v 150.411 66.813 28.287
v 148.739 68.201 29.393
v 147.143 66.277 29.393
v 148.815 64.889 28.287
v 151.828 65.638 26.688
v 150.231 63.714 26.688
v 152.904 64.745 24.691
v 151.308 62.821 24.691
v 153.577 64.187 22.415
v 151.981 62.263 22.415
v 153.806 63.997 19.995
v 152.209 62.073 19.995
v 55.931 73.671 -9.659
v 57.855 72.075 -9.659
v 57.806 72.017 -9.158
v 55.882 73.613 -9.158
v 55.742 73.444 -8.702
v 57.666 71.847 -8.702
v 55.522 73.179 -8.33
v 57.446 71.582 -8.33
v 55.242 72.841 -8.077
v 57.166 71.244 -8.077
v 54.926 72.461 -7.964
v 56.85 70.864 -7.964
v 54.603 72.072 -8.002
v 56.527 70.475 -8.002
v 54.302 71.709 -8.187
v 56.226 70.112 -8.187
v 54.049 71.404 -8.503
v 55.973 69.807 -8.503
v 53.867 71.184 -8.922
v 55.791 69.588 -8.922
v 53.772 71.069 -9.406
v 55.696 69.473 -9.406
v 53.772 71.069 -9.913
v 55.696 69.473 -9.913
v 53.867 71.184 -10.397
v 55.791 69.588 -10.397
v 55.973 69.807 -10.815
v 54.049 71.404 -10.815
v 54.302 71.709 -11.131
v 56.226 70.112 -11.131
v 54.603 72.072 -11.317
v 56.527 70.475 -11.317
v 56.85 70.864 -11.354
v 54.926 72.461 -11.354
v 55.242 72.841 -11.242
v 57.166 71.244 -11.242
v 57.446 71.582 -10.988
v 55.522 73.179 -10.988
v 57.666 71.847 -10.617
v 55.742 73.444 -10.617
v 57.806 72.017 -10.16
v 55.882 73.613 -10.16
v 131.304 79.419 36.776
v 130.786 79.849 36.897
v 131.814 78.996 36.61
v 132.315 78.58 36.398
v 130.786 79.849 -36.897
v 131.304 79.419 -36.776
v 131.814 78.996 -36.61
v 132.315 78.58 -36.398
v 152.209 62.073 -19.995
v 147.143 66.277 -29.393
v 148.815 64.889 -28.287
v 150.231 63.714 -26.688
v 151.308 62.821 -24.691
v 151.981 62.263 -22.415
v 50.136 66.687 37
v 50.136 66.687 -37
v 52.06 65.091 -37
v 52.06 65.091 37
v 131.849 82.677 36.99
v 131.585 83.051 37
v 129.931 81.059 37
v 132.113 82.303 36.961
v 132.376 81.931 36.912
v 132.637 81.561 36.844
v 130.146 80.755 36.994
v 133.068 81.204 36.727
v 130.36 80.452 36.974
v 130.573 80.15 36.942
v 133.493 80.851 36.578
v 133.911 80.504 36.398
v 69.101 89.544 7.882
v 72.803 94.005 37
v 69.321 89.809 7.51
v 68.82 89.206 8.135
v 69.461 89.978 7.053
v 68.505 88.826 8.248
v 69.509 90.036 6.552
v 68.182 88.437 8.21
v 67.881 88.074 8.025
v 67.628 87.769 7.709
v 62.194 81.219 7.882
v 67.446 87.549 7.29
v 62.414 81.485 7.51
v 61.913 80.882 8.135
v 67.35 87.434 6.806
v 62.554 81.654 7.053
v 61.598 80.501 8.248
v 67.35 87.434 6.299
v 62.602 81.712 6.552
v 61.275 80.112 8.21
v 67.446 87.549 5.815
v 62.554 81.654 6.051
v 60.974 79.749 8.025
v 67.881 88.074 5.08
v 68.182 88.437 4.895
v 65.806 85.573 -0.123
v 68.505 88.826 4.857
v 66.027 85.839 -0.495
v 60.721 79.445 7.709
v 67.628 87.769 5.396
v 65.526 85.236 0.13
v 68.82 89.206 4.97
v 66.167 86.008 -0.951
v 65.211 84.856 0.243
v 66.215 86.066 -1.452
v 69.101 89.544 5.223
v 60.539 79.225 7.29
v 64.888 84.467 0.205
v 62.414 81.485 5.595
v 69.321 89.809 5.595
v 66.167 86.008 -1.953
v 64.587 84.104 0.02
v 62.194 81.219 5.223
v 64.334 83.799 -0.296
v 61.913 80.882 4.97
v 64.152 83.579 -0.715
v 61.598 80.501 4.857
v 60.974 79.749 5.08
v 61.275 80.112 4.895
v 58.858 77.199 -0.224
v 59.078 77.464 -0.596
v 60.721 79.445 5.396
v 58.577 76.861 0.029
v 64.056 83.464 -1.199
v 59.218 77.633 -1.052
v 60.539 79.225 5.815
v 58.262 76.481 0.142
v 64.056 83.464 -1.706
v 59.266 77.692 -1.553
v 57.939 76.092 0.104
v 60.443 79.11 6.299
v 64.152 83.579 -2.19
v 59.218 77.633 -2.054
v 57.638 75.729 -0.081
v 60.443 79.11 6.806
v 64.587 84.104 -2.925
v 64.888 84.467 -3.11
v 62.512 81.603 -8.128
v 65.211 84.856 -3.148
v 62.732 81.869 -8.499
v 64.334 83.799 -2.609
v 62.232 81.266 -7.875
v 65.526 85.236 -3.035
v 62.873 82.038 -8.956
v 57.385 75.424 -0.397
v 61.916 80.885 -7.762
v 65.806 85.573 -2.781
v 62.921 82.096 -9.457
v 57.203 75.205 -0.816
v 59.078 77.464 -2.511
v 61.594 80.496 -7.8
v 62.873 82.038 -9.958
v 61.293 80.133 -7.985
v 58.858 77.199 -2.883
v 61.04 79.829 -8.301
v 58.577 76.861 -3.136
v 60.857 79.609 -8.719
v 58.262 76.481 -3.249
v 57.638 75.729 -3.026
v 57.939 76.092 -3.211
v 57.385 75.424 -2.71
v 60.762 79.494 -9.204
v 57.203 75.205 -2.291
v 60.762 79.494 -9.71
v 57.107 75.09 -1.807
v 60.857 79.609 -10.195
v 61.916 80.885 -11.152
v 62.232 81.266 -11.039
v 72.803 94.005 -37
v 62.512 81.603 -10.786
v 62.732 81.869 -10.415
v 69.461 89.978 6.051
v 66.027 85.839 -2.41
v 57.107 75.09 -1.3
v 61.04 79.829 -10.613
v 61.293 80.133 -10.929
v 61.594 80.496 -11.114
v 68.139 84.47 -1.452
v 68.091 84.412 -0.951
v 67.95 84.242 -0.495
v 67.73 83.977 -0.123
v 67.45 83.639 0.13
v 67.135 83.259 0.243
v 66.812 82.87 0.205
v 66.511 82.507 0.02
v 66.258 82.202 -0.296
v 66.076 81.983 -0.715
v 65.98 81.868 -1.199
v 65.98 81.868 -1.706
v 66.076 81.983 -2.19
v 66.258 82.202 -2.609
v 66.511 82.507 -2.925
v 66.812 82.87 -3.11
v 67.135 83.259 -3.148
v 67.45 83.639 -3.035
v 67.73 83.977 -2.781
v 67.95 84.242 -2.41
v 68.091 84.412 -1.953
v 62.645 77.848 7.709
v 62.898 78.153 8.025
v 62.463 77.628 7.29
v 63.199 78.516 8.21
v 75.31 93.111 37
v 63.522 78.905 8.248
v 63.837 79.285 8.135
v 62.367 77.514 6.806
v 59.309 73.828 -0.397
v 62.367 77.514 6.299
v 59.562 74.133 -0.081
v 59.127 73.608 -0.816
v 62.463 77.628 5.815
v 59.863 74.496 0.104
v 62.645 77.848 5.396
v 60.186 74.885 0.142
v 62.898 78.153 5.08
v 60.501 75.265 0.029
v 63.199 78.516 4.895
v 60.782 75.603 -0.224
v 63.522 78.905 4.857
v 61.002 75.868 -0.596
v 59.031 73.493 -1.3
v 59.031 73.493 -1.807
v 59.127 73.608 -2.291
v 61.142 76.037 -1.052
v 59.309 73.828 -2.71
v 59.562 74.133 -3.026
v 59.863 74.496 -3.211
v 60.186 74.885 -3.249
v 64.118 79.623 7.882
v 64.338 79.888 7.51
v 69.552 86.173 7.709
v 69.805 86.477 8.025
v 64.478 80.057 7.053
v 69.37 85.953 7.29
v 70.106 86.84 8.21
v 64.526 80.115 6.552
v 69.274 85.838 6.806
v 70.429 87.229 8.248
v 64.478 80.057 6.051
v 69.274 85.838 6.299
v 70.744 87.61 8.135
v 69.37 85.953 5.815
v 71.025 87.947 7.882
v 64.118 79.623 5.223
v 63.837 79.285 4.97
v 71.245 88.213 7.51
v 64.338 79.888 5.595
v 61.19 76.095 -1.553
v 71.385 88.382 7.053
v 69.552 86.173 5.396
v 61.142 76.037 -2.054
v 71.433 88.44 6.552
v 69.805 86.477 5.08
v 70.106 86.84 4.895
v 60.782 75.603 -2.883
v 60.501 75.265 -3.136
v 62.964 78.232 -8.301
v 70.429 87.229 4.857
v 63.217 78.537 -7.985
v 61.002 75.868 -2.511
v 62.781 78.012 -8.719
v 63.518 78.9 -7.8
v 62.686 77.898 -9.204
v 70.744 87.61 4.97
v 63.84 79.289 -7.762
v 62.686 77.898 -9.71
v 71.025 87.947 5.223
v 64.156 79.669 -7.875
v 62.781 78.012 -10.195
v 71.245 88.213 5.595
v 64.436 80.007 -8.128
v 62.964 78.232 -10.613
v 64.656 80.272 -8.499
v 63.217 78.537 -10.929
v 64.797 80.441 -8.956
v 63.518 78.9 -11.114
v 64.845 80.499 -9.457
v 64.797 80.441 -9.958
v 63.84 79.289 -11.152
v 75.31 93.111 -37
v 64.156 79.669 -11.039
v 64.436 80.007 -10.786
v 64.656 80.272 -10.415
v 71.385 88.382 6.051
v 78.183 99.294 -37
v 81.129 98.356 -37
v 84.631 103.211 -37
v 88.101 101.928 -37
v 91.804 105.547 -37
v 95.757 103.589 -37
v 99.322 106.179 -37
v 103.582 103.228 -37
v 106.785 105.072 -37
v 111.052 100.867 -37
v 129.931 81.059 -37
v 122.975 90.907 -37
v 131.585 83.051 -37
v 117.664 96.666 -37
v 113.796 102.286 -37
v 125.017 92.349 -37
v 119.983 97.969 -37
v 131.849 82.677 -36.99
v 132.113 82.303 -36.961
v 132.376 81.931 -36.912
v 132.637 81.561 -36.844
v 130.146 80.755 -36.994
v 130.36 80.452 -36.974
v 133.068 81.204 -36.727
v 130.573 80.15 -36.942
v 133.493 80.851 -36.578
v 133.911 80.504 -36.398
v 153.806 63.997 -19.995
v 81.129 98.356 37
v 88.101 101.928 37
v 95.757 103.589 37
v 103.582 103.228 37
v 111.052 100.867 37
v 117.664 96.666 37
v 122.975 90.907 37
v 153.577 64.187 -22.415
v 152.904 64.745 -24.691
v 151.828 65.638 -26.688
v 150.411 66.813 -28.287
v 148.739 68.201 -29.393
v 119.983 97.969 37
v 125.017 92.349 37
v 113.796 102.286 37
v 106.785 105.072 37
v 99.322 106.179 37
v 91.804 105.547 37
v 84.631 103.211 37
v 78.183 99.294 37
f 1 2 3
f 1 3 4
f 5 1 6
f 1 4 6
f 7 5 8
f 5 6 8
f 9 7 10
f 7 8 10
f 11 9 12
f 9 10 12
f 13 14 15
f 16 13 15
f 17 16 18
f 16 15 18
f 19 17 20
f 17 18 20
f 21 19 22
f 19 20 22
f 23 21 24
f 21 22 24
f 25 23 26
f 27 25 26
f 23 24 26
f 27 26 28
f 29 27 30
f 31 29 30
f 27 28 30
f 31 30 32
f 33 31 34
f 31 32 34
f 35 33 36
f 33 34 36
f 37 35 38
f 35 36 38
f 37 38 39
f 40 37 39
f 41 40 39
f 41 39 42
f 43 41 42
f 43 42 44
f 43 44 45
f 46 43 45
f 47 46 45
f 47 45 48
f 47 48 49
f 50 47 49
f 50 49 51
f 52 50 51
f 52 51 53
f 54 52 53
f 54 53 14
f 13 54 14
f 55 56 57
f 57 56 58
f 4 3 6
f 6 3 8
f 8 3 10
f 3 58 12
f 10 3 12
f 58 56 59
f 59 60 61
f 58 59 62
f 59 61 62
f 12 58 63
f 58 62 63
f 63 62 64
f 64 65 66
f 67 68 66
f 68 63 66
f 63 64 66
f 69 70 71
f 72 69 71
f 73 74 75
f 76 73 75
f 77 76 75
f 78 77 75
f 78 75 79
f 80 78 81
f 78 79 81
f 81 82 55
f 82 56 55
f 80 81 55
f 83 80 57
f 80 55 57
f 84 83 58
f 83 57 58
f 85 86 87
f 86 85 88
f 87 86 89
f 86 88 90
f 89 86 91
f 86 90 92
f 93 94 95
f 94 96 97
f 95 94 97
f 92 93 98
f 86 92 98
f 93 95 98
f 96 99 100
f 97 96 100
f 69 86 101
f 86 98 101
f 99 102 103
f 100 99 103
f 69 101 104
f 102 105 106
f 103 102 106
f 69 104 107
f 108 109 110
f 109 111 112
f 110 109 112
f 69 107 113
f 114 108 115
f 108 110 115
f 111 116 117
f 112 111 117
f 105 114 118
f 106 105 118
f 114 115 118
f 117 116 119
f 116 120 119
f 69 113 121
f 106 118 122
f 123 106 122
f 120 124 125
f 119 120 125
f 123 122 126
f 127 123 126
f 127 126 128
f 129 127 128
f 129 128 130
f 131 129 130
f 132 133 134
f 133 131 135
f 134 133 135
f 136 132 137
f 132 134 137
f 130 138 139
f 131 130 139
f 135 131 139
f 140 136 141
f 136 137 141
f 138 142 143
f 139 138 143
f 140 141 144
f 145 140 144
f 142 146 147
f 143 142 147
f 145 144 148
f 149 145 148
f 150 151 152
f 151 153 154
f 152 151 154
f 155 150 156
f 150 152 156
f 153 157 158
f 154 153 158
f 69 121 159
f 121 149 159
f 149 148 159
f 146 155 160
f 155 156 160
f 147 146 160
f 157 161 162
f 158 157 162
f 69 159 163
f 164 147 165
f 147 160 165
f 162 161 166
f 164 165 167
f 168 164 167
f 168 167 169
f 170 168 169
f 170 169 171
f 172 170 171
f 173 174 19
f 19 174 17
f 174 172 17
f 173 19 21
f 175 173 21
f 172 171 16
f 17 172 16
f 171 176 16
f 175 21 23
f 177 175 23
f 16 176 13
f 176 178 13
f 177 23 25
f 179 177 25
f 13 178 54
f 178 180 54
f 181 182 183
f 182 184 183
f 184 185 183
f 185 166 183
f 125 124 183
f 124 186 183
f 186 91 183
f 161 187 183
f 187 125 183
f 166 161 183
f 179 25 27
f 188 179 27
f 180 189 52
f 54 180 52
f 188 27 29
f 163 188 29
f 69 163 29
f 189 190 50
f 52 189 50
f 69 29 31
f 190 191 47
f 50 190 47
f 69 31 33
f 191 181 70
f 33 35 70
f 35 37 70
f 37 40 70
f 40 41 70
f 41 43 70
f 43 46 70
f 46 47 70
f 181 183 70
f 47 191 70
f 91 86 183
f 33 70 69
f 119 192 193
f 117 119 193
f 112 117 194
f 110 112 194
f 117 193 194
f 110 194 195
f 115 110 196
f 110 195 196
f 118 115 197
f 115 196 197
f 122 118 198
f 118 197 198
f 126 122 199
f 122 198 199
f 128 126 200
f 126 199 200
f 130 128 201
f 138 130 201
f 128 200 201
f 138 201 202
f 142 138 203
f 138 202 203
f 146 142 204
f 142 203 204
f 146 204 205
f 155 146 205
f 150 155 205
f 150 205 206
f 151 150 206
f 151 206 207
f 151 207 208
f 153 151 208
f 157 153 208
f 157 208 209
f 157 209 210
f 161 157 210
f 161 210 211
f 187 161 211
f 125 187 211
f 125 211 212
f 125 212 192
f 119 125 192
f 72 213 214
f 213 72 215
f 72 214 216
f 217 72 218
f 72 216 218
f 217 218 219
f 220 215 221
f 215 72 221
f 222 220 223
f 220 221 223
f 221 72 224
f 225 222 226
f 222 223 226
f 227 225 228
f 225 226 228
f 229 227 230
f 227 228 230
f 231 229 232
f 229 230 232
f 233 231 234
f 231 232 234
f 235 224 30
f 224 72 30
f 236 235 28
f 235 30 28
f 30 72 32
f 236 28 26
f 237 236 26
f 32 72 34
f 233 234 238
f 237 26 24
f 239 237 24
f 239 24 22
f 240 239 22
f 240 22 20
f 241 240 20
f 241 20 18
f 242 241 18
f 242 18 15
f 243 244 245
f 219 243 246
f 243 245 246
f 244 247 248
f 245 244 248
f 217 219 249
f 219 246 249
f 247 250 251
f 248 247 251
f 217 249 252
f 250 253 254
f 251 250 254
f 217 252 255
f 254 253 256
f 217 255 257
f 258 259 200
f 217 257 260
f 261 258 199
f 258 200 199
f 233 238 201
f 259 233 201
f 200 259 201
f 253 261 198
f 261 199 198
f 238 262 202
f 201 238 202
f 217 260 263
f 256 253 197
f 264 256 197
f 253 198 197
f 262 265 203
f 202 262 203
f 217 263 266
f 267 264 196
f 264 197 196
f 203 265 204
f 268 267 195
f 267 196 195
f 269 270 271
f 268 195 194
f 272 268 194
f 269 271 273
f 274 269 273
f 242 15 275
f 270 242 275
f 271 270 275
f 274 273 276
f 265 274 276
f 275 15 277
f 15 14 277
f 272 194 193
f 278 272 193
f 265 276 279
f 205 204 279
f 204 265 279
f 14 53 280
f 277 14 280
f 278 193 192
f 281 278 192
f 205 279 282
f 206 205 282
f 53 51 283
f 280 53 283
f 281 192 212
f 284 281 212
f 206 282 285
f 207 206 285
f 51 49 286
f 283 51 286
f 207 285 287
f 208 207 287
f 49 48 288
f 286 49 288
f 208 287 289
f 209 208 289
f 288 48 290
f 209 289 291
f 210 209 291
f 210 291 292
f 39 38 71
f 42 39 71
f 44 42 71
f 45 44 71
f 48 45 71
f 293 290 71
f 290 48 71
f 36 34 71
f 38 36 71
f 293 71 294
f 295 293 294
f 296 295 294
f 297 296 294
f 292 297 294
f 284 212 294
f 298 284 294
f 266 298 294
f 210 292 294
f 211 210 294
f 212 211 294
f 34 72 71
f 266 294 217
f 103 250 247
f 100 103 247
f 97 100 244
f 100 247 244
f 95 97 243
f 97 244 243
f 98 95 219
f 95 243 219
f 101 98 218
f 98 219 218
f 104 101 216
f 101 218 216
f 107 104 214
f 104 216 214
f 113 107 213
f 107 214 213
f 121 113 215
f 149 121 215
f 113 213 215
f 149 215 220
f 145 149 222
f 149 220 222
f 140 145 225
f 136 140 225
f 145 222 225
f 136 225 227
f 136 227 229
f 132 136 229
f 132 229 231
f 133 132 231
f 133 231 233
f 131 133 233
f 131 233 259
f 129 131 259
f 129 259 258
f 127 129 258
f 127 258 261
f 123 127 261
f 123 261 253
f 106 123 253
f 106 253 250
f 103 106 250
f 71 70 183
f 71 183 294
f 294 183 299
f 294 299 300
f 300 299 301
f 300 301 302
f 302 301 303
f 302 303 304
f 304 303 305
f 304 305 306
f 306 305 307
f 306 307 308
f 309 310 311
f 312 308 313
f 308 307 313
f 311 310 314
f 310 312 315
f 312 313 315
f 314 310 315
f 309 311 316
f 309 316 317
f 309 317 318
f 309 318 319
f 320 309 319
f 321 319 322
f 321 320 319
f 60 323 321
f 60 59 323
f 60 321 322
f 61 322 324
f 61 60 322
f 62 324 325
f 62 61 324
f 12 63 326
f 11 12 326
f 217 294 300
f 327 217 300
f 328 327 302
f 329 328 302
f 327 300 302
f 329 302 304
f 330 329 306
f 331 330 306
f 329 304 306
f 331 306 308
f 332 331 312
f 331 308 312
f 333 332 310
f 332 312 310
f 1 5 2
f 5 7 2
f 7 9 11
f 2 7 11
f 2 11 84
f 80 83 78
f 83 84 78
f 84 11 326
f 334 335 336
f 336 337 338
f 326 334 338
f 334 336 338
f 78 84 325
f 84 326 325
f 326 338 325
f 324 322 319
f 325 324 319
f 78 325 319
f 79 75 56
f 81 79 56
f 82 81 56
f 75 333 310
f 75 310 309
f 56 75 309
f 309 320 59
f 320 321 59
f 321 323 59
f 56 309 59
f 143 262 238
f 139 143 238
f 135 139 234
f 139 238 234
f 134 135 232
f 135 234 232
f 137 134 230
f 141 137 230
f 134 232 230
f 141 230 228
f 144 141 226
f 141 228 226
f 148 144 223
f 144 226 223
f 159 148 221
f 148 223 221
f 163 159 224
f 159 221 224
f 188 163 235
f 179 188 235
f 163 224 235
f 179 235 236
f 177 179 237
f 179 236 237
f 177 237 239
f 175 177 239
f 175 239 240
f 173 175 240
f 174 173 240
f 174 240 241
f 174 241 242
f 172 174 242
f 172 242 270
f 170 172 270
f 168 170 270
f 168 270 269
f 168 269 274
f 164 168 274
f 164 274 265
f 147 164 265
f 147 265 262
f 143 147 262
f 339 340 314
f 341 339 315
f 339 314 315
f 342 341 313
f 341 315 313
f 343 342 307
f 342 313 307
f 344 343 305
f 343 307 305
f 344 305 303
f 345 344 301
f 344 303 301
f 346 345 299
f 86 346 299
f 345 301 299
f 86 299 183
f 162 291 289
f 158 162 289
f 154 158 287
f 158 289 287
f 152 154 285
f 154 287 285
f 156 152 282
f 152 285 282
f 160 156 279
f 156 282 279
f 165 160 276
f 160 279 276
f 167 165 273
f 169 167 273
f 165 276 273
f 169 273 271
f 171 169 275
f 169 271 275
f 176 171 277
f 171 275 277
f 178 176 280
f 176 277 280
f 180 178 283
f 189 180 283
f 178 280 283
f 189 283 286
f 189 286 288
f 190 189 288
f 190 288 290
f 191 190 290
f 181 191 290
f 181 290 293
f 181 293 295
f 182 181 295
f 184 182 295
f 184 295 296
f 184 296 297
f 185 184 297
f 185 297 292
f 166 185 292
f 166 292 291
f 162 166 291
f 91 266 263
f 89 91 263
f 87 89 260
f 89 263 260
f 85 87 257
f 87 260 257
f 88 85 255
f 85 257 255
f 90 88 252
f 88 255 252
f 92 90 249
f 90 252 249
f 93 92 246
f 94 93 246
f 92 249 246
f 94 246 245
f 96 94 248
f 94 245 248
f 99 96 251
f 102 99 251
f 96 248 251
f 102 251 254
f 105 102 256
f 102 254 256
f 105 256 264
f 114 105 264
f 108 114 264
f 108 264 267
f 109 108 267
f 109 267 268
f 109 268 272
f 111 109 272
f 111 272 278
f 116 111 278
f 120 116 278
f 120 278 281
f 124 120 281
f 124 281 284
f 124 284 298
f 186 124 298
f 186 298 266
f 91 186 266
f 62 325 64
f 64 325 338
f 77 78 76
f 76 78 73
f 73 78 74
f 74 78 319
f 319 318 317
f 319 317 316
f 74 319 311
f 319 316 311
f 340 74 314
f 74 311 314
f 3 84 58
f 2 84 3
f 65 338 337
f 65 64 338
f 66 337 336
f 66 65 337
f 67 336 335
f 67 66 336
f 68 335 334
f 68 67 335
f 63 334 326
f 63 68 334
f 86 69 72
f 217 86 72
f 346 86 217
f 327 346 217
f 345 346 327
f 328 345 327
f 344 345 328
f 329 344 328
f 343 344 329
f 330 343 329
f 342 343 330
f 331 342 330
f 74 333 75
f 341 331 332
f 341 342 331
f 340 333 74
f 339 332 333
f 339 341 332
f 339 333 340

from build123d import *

# Parameters (mm, degrees)
ESTRUSIONE_SOTTILE1_START = -37
ESTRUSIONE_SOTTILE1_DEPTH = 74
SCHIZZO2_R                = 1.7
TAGLIO_ESTRUSIONE2_DEPTH  = 23
TAGLIO_ESTRUSIONE4_DEPTH  = 10
RACCORDO1_R               = 10


# Read off the part's stored shape, not the designer's step: Estrusione-Sottile1
with BuildPart() as part:
    # Estrusione-Sottile1 outline → Estrusione-Sottile1 (new body)
    with BuildSketch(Plane.XY.offset(ESTRUSIONE_SOTTILE1_START)):
        with BuildLine():
            ThreePointArc((75.309556173, 93.111427552), (99.681203079, 103.663061306), (122.974907994, 90.906985924))
            Line((122.974907994, 90.906985924), (130.786083182, 79.848715119))
            Line((130.786083182, 79.848715119), (152.209243946, 62.072969532))
            Line((152.209243946, 62.072969532), (153.805626203, 63.996914357))
            Line((153.805626203, 63.996914357), (132.637123428, 81.561358928))
            Line((132.637123428, 81.561358928), (125.016863249, 92.349351598))
            ThreePointArc((125.016863249, 92.349351598), (99.3221362, 106.178890254), (72.802722922, 94.005318182))
            Line((72.802722922, 94.005318182), (50.135913498, 66.687493457))
            Line((50.135913498, 66.687493457), (52.059858323, 65.0911112))
            Line((52.059858323, 65.0911112), (75.309556173, 93.111427552))
        make_face()
    extrude(amount=ESTRUSIONE_SOTTILE1_DEPTH)

    # Schizzo2 → Taglio-Estrusione2 (cut)
    with BuildSketch(Plane(origin=(-1.154366895, 0.957829354, 0), x_dir=(0, 0, -1), z_dir=(0.76957792998473, -0.6385529028047858, 0))):
        with Locations(Location((-6.552412565, 111.975385882, 0), (0, 0, 90))):
            Circle(SCHIZZO2_R)
        with Locations(Location((-6.552412565, 101.158520834, 0), (0, 0, 90))):
            Circle(SCHIZZO2_R)
        with Locations(Location((1.452296176, 106.816436865, 0), (0, 0, 90))):
            Circle(SCHIZZO2_R)
        with Locations(Location((9.457004918, 101.657487848, 0), (0, 0, 90))):
            Circle(SCHIZZO2_R)
        with Locations(Location((1.553386665, 95.93442008, 0), (0, 0, 90))):
            Circle(SCHIZZO2_R)
        with Locations(Location((9.659185895, 90.710319326, 0), (0, 0, 90))):
            Circle(SCHIZZO2_R)
    extrude(amount=-TAGLIO_ESTRUSIONE2_DEPTH, mode=Mode.SUBTRACT)

    # Schizzo3 → Taglio-Estrusione4 (cut)
    with BuildSketch(Plane(origin=(94.163336629, 113.484764324, 0), x_dir=(0.769577929984725, -0.6385529028047917, 0), z_dir=(0.6385529028047917, 0.769577929984725, 0))):
        Polygon((49.993360387, -37), (77.5, -27), (77.5, -37), align=None)
        Polygon((49.993360387, 37), (77.5, 27), (77.5, 37), align=None)
    extrude(amount=-TAGLIO_ESTRUSIONE4_DEPTH, mode=Mode.SUBTRACT)

    # Raccordo1
    raccordo1_edges = [part.edges().sort_by_distance(p)[0] for p in [
        (131.8389323, 80.599386516, -37),
        (131.8389323, 80.599386516, 37),
        (153.007435074, 63.034941944, -27),
        (153.007435074, 63.034941944, 27),
    ]]
    fillet(raccordo1_edges, radius=RACCORDO1_R)


solid = part.part
